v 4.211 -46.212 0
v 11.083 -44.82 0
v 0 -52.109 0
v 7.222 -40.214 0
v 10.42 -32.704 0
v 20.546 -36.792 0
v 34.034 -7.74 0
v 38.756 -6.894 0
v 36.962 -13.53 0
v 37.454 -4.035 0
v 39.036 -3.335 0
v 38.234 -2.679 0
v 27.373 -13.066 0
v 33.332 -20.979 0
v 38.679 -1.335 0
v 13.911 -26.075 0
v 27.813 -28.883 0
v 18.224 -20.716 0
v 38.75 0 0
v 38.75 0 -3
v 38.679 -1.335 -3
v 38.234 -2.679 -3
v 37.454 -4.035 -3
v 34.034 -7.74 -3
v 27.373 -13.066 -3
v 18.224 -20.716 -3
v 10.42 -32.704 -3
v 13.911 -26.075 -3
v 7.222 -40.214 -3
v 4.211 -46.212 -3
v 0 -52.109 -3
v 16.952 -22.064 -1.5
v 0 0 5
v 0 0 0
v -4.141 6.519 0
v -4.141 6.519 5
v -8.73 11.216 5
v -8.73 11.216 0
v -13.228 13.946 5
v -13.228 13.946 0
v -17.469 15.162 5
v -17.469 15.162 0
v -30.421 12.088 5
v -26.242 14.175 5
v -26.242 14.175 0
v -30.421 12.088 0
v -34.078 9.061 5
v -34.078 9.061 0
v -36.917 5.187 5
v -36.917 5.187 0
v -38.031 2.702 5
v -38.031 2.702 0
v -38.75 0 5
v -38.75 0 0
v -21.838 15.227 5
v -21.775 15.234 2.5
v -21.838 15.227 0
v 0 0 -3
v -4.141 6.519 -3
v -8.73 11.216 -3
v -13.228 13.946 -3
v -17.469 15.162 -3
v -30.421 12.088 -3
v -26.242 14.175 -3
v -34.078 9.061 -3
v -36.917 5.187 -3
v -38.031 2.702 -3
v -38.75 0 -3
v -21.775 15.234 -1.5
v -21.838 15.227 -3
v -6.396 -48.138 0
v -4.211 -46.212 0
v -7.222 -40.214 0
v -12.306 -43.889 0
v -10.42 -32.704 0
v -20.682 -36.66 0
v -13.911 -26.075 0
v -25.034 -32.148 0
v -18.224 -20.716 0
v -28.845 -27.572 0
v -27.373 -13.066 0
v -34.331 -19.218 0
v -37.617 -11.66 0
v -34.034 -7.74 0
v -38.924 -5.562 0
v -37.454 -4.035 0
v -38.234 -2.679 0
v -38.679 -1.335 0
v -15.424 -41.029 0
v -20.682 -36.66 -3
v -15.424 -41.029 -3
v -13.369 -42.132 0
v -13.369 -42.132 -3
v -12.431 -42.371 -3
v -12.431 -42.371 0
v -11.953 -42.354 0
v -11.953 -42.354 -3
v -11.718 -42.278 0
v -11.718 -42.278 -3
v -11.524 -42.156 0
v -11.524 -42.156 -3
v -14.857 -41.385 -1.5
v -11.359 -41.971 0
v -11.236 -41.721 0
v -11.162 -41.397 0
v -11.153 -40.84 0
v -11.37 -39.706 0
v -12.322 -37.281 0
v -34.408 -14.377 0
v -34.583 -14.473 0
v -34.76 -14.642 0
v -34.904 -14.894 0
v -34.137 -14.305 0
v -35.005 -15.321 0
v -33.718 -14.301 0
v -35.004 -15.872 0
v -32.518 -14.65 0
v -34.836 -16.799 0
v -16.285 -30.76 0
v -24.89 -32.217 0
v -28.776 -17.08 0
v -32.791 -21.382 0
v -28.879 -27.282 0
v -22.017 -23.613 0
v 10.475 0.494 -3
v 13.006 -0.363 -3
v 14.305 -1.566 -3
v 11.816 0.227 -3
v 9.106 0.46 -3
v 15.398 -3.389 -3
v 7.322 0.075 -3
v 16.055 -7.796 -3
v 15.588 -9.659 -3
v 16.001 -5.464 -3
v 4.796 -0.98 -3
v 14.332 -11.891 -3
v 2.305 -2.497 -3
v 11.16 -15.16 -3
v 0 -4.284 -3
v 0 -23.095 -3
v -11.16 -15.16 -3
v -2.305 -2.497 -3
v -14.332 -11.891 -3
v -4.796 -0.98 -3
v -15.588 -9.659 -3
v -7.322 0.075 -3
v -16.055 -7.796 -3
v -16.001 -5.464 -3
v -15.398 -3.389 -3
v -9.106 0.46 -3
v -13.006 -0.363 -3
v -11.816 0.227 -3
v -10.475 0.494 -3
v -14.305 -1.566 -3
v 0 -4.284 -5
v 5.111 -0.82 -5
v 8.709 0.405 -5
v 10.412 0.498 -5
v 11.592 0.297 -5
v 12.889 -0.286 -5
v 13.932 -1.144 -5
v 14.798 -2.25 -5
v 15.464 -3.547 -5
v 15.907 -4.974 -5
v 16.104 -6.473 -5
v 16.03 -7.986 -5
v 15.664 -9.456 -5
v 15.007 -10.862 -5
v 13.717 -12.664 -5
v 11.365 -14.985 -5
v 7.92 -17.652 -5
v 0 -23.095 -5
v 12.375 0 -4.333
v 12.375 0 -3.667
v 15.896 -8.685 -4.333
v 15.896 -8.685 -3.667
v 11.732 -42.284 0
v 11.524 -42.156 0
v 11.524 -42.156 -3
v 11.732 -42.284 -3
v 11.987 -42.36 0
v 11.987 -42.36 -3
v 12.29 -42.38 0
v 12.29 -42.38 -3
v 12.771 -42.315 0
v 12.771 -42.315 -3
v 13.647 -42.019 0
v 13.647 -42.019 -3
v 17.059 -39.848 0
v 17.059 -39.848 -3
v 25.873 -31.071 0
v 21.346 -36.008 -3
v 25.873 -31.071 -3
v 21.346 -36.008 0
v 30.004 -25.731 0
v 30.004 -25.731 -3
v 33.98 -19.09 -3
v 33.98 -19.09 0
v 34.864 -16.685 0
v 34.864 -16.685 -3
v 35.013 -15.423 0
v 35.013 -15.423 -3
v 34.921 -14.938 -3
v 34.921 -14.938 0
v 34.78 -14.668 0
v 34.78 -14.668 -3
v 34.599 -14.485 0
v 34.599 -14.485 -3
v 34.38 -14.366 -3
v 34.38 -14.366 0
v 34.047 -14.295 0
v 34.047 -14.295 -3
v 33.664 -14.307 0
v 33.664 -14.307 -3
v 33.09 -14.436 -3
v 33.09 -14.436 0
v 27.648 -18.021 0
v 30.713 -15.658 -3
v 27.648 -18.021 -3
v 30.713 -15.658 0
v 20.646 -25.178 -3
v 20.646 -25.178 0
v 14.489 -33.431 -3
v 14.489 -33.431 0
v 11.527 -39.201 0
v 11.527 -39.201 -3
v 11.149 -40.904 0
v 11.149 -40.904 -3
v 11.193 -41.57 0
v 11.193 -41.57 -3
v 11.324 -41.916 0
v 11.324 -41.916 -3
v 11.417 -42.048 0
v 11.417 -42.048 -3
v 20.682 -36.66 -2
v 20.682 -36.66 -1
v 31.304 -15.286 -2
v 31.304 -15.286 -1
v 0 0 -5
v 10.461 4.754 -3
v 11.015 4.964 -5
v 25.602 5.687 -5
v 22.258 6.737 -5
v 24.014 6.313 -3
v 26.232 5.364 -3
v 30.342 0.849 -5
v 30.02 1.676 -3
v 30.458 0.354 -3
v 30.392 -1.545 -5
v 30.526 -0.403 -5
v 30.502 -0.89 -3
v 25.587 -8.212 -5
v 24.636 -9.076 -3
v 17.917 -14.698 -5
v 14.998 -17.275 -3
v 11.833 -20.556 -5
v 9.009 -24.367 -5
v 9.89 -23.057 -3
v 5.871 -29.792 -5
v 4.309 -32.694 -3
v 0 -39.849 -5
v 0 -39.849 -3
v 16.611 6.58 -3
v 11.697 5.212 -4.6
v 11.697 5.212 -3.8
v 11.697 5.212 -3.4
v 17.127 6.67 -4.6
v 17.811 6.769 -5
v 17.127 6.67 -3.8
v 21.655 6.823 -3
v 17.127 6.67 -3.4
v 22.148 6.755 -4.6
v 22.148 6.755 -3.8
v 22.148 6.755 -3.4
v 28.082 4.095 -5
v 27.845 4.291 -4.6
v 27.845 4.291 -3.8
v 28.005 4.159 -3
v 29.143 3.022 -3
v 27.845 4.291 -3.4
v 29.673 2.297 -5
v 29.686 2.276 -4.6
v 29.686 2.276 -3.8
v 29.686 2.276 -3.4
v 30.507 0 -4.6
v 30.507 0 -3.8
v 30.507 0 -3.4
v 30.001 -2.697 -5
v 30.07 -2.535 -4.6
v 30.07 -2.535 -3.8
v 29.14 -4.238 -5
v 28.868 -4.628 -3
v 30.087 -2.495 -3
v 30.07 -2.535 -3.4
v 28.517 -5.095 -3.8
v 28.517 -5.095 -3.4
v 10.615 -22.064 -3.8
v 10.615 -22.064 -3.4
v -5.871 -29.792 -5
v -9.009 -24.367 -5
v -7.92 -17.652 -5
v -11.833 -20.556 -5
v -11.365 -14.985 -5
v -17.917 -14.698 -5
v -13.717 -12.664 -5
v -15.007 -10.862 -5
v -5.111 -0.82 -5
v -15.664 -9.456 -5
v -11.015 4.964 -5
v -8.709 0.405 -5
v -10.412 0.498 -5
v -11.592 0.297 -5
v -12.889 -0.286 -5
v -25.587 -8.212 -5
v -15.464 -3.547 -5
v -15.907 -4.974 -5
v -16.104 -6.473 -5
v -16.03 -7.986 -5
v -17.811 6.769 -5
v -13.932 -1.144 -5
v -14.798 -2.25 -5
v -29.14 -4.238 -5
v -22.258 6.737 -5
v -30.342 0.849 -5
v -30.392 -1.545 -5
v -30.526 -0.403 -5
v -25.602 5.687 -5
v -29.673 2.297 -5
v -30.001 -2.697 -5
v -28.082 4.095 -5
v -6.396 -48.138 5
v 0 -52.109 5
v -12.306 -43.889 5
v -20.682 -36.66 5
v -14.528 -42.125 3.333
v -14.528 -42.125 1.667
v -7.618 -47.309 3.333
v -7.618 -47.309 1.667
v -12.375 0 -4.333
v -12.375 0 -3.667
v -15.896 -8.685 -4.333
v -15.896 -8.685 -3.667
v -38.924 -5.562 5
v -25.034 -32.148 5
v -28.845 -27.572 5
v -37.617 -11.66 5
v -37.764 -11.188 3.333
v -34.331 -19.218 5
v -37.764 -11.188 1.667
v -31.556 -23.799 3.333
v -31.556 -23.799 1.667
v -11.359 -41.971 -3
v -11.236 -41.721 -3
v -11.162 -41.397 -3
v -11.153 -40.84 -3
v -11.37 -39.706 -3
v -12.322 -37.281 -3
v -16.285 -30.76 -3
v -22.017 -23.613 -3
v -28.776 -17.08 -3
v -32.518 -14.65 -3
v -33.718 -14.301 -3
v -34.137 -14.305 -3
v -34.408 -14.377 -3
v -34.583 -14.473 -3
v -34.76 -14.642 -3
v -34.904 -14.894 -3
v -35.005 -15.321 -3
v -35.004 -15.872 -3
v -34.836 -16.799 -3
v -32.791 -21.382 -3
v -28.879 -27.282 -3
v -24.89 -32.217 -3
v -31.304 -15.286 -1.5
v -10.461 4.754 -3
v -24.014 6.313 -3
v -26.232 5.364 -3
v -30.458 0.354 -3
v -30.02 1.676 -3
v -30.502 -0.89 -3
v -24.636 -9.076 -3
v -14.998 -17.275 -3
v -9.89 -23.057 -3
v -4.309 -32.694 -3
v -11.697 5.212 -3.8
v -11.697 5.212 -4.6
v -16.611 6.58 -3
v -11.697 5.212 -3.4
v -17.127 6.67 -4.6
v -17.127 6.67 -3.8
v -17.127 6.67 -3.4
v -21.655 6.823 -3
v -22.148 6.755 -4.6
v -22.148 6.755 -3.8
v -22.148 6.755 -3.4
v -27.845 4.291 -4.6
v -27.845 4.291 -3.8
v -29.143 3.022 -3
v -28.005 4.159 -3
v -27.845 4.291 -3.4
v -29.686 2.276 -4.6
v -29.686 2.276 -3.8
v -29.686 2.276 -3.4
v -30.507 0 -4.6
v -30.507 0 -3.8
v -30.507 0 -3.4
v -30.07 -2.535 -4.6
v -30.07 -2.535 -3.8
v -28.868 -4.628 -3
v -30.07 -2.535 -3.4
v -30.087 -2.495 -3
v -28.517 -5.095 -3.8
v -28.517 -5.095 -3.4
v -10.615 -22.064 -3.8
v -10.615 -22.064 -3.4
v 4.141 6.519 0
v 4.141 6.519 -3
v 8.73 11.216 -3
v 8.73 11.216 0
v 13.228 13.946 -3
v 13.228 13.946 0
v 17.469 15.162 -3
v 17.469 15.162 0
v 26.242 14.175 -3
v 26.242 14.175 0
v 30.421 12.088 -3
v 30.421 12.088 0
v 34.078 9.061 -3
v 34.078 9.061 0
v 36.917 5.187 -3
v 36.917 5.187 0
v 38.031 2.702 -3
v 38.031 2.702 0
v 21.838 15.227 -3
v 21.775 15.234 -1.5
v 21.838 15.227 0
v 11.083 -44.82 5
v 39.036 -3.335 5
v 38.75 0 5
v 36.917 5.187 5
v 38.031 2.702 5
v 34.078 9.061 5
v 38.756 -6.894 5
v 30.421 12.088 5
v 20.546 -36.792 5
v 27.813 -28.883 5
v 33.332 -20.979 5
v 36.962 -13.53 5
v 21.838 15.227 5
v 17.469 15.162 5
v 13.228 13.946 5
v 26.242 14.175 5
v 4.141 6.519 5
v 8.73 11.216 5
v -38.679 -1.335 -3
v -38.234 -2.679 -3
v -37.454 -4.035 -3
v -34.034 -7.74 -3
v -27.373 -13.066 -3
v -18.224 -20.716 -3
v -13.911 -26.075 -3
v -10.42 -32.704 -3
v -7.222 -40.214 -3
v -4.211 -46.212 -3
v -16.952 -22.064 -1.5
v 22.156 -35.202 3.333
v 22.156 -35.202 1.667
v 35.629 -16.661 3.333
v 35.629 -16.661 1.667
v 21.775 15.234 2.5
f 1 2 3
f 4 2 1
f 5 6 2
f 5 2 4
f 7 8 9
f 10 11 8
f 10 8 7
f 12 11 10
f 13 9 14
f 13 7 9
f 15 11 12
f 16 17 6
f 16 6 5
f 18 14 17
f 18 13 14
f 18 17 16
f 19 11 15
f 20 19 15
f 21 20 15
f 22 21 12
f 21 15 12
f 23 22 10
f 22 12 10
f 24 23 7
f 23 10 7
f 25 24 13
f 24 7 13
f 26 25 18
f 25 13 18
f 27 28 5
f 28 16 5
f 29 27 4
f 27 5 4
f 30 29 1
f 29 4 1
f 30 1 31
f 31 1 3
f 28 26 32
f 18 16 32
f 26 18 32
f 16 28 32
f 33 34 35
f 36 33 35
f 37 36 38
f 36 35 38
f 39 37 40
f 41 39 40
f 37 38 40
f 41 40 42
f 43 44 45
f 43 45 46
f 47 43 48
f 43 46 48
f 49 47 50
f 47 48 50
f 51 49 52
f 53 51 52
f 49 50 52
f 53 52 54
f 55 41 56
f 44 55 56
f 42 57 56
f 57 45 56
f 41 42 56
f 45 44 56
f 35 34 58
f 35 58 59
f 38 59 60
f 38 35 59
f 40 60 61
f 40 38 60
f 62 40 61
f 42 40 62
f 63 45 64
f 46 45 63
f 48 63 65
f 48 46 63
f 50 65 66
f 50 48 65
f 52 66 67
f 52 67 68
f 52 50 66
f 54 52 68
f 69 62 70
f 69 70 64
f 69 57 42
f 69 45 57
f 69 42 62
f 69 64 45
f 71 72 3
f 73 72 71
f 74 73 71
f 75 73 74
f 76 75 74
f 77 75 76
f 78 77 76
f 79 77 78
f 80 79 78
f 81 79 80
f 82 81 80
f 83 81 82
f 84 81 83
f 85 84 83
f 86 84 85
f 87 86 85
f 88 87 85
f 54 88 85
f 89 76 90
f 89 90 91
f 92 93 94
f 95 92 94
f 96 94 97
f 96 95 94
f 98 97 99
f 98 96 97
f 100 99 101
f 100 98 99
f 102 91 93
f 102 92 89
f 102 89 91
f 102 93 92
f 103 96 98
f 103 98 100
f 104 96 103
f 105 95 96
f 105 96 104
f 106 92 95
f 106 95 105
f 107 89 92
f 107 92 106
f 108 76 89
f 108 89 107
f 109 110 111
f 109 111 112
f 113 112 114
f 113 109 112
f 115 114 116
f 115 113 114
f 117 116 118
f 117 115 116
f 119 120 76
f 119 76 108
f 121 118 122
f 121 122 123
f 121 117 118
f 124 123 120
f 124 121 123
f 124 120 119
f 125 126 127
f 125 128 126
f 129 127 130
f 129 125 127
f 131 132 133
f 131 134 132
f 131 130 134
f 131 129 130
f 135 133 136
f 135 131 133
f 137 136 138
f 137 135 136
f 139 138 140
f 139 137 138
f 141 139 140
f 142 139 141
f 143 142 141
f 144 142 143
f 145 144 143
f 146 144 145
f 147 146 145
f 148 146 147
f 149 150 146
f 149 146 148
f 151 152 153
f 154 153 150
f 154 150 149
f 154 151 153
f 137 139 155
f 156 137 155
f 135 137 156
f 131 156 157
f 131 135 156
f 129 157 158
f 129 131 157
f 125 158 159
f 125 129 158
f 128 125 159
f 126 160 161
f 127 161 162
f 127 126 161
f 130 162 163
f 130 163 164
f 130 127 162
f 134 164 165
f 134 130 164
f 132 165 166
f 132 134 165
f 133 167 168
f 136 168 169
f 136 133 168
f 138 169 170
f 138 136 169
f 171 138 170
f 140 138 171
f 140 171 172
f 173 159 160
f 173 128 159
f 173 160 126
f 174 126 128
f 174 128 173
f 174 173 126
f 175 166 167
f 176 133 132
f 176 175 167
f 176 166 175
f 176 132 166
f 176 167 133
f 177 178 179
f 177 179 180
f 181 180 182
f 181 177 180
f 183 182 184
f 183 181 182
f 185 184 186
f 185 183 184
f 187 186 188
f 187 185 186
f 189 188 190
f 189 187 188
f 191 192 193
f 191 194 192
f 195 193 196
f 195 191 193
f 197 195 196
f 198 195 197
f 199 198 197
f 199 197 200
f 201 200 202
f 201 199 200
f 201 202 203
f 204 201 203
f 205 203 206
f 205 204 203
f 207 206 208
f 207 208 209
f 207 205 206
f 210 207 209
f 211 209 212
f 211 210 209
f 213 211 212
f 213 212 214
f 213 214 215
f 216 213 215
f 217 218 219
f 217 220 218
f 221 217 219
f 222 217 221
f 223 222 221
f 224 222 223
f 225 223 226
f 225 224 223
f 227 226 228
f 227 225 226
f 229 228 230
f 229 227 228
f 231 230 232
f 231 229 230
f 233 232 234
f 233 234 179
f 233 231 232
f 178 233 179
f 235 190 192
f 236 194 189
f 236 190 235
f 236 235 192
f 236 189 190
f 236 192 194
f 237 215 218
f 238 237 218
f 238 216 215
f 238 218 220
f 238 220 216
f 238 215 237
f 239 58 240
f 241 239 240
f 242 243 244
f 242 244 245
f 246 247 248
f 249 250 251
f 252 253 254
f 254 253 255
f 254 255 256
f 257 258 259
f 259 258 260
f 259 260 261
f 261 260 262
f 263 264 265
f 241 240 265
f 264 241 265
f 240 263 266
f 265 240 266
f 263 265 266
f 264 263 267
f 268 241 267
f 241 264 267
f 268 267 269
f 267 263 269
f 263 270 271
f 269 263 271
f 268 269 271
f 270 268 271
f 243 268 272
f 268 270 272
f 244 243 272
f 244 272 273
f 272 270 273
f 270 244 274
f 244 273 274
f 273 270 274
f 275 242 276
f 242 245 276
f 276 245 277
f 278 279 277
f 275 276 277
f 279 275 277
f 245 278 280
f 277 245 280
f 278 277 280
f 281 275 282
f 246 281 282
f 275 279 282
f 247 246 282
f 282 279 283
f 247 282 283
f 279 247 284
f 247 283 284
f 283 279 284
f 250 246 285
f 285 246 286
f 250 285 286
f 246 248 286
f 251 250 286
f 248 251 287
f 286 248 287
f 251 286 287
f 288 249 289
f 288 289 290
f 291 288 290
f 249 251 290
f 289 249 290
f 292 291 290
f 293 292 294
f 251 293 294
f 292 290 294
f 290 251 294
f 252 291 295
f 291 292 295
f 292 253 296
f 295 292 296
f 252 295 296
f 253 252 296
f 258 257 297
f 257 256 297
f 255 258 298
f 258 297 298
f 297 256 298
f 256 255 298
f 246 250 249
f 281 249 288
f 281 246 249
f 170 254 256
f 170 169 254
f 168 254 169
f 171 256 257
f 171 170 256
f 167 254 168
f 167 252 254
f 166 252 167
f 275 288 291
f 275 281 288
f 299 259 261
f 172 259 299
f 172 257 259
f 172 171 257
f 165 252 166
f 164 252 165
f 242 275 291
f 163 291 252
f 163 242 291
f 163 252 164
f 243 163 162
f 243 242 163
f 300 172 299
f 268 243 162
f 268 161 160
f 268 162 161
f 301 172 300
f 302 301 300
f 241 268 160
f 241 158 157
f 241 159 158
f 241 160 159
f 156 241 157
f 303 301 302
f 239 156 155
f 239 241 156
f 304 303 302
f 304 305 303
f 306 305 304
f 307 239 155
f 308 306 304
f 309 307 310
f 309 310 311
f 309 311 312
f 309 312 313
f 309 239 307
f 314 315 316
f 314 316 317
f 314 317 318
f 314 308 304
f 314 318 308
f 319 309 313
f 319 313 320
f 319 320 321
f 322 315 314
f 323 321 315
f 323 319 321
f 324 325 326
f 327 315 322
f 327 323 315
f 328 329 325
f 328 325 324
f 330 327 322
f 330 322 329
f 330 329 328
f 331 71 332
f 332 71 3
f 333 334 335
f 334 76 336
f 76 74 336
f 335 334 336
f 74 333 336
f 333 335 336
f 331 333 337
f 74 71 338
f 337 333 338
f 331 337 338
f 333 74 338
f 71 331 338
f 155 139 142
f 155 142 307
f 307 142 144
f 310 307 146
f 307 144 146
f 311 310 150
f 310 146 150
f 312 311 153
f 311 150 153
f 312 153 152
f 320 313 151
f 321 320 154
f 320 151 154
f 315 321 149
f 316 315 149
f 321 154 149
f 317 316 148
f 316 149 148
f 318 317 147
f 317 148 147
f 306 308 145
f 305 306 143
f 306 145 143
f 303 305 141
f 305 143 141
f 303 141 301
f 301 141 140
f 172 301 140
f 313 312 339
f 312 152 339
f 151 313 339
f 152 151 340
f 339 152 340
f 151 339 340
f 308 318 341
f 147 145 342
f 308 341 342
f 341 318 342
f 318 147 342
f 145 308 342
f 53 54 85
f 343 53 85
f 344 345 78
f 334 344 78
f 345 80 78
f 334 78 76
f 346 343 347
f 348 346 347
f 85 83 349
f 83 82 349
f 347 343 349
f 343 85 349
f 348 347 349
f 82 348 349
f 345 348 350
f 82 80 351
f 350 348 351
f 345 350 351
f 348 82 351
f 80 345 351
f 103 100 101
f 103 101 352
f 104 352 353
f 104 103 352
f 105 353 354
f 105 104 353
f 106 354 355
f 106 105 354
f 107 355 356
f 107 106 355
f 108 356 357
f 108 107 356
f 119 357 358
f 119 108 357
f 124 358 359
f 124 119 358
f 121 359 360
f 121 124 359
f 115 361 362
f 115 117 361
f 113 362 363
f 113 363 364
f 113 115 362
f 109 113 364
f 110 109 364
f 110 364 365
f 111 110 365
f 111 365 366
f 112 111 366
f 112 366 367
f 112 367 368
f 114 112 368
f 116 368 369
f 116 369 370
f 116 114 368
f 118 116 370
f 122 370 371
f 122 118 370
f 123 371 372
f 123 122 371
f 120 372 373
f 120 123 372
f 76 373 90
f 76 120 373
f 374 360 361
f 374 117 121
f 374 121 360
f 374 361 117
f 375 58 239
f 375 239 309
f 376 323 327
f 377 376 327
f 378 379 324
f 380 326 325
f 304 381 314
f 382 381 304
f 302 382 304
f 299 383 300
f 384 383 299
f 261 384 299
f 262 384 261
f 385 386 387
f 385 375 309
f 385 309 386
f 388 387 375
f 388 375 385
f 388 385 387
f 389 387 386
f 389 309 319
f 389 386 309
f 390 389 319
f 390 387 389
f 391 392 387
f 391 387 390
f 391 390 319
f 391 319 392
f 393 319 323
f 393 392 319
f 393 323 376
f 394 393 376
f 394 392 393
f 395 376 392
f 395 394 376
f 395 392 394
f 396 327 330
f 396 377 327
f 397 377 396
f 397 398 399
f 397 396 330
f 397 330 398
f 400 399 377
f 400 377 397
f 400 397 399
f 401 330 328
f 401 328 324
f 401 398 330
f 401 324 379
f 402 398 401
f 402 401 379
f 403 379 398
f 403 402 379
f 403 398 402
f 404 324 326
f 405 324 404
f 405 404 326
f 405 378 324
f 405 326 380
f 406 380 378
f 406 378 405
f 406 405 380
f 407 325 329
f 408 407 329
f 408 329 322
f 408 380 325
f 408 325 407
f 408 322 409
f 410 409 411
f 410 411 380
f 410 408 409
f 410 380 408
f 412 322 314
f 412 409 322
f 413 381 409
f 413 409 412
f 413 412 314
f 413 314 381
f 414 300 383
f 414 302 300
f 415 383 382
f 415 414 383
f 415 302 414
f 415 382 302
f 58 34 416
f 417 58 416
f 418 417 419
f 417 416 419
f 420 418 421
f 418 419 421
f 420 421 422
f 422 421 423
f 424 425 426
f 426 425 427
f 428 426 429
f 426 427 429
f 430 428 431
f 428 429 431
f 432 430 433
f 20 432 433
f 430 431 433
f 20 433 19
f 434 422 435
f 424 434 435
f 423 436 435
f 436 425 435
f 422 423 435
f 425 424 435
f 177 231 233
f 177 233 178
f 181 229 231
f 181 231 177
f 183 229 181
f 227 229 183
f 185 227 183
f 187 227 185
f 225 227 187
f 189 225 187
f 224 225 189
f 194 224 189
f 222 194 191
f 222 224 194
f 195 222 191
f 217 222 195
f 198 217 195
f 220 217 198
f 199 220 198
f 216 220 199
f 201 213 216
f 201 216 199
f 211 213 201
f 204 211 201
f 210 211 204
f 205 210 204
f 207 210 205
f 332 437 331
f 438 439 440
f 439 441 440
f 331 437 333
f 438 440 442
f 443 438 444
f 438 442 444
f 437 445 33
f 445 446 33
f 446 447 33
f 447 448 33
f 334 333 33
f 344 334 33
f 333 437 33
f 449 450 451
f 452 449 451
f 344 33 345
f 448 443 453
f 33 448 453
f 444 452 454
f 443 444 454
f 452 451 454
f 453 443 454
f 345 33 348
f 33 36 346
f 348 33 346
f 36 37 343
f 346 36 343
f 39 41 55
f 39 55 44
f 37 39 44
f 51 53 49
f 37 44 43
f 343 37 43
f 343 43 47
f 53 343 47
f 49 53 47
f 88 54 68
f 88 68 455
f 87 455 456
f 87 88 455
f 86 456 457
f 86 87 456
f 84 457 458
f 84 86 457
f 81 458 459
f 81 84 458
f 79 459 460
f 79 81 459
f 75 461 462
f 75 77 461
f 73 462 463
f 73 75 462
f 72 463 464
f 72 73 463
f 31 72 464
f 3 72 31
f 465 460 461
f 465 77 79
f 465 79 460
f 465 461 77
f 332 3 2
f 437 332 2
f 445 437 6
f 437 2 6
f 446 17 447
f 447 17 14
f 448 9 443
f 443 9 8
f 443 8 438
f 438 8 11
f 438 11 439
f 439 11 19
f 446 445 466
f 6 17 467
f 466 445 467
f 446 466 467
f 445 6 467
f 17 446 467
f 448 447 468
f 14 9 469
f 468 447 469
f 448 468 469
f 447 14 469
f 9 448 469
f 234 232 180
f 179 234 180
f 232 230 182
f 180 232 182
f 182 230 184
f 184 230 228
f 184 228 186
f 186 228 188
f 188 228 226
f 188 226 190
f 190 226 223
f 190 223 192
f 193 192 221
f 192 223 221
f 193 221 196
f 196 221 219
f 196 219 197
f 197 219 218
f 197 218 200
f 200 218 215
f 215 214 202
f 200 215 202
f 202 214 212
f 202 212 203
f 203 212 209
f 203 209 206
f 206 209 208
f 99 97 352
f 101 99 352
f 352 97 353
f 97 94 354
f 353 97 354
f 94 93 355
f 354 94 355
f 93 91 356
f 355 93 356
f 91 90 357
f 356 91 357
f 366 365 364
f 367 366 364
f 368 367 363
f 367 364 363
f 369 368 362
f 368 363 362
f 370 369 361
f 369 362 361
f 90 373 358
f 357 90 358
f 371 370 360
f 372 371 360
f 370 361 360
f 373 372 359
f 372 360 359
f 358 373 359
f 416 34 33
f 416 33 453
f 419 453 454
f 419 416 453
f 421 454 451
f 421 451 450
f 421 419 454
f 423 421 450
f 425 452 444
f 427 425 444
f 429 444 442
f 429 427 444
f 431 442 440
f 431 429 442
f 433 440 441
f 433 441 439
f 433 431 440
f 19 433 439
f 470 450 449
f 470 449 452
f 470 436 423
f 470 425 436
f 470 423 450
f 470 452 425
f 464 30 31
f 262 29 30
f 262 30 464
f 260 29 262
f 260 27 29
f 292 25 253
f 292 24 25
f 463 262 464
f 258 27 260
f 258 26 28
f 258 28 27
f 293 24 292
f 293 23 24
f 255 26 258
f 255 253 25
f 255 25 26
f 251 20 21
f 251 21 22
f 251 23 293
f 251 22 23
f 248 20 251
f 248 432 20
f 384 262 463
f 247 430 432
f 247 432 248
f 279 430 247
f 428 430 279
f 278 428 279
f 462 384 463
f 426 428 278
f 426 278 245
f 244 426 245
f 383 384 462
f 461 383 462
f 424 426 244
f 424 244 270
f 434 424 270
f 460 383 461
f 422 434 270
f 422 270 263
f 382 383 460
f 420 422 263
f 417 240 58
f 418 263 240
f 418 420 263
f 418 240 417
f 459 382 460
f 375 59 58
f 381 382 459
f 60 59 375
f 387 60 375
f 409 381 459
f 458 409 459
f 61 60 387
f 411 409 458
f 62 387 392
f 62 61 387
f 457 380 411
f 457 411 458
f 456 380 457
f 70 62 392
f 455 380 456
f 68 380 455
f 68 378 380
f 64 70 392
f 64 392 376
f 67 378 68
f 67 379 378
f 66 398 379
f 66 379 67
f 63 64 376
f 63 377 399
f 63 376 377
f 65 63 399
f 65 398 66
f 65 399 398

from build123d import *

# Parameters (mm, degrees)
F1_DEPTH = 5
F2_DEPTH = 3
F3_DEPTH = 5


# Not quite as in the source:
# - a feature names something its author has since deleted; it is built from what else it names


with BuildPart() as f1:
    # F0 (on Top) → F1 (new body)
    with BuildSketch(Plane.XY):
        with BuildLine():
            add(Edge.make_bspline(
                [(0, 0), (5.8826601211, 11.2702567006), (20.8111578849, 20.6386629418), (37.2014190882, 8.6220207342), (38.749657821, 0)],
                knots=[0, 0, 0, 0, 0.2865659188, 0.5520449891, 0.5520449891, 0.5520449891, 0.5520449891], degree=3))
            add(Edge.make_bspline(
                [(0, 0), (-5.8826601211, 11.2702567006), (-20.8111578849, 20.6386629418), (-37.2014190882, 8.6220207342), (-38.749657821, 0)],
                knots=[0, 0, 0, 0, 0.2865659188, 0.5520449891, 0.5520449891, 0.5520449891, 0.5520449891], degree=3))
            add(Edge.make_bspline(
                [(-38.749657821, 0), (-39.4012299945, -6.6213969341), (-9.0327868439, -20.6953577001), (-8.685916815, -42.126413839), (0, -52.1089205623)],
                knots=[0, 0, 0, 0, 0.4867027196, 1, 1, 1, 1], degree=3))
            add(Edge.make_bspline(
                [(38.749657821, 0), (39.4012299945, -6.6213969341), (9.0327868439, -20.6953577001), (8.685916815, -42.126413839), (0, -52.1089205623)],
                knots=[0, 0, 0, 0, 0.4867027196, 1, 1, 1, 1], degree=3))
        make_face()
        with BuildLine():
            add(Edge.make_bspline(
                [(0, 0), (-8.039671318, 3.887850868), (-21.0375310132, 10.3979423013), (-34.1851204628, -0.0331959557), (-22.9358554941, -11.1083712256), (-9.0780722669, -20.9680892381), (-4.1014407761, -34.0341217816), (0, -39.8491583765)],
                knots=[0, 0, 0, 0, 0.236574756, 0.3977476477, 0.5702206455, 0.7762521683, 1, 1, 1, 1], degree=3))
            add(Edge.make_bspline(
                [(0, 0), (8.039671318, 3.887850868), (21.0375310132, 10.3979423013), (34.1851204628, -0.0331959557), (22.9358554941, -11.1083712256), (9.0780722669, -20.9680892381), (4.1014407761, -34.0341217816), (0, -39.8491583765)],
                knots=[0, 0, 0, 0, 0.236574756, 0.3977476477, 0.5702206455, 0.7762521683, 1, 1, 1, 1], degree=3))
        make_face(mode=Mode.SUBTRACT)
        with BuildLine():
            add(Edge.make_bspline(
                [(0, 0), (8.039671318, 3.887850868), (21.0375310132, 10.3979423013), (34.1851204628, -0.0331959557), (22.9358554941, -11.1083712256), (9.0780722669, -20.9680892381), (4.1014407761, -34.0341217816), (0, -39.8491583765)],
                knots=[0, 0, 0, 0, 0.236574756, 0.3977476477, 0.5702206455, 0.7762521683, 1, 1, 1, 1], degree=3))
            add(Edge.make_bspline(
                [(0, 0), (-8.039671318, 3.887850868), (-21.0375310132, 10.3979423013), (-34.1851204628, -0.0331959557), (-22.9358554941, -11.1083712256), (-9.0780722669, -20.9680892381), (-4.1014407761, -34.0341217816), (0, -39.8491583765)],
                knots=[0, 0, 0, 0, 0.236574756, 0.3977476477, 0.5702206455, 0.7762521683, 1, 1, 1, 1], degree=3))
        make_face()
        with BuildLine():
            add(Edge.make_bspline(
                [(0, -4.2843823321), (-4.3131672708, -0.5965221259), (-13.217639527, 3.3797390078), (-19.1463981552, -11.3037035401), (-7.8477509016, -17.6284155745), (0, -23.0948515236)],
                knots=[0, 0, 0, 0, 0.3199063089, 0.5905308347, 1, 1, 1, 1], degree=3))
            add(Edge.make_bspline(
                [(0, -4.2843823321), (4.3131672708, -0.5965221259), (13.217639527, 3.3797390078), (19.1463981552, -11.3037035401), (7.8477509016, -17.6284155745), (0, -23.0948515236)],
                knots=[0, 0, 0, 0, 0.3199063089, 0.5905308347, 1, 1, 1, 1], degree=3))
        make_face(mode=Mode.SUBTRACT)
        with BuildLine():
            add(Edge.make_bspline(
                [(0, -4.2843823321), (4.3131672708, -0.5965221259), (13.217639527, 3.3797390078), (19.1463981552, -11.3037035401), (7.8477509016, -17.6284155745), (0, -23.0948515236)],
                knots=[0, 0, 0, 0, 0.3199063089, 0.5905308347, 1, 1, 1, 1], degree=3))
            add(Edge.make_bspline(
                [(0, -4.2843823321), (-4.3131672708, -0.5965221259), (-13.217639527, 3.3797390078), (-19.1463981552, -11.3037035401), (-7.8477509016, -17.6284155745), (0, -23.0948515236)],
                knots=[0, 0, 0, 0, 0.3199063089, 0.5905308347, 1, 1, 1, 1], degree=3))
        make_face()
        with BuildLine():
            add(Edge.make_bspline(
                [(-38.749657821, 0), (-39.4012299945, -6.6213969341), (-9.0327868439, -20.6953577001), (-8.685916815, -42.126413839), (0, -52.1089205623)],
                knots=[0, 0, 0, 0, 0.4867027196, 1, 1, 1, 1], degree=3))
            add(Edge.make_bspline(
                [(-38.749657821, 0), (-40.5608709324, -10.0865045363), (-33.7038328837, -24.0640985889), (-20.6823740602, -36.6602716931)],
                knots=[0.5520449891, 0.5520449891, 0.5520449891, 0.5520449891, 0.8626167135, 0.8626167135, 0.8626167135, 0.8626167135], degree=3))
            add(Edge.make_bspline(
                [(-20.6823740602, -36.6602716931), (-14.9222527489, -42.2322652862), (-7.9558844229, -47.5339439616), (0, -52.1089205623)],
                knots=[0.8626167135, 0.8626167135, 0.8626167135, 0.8626167135, 1, 1, 1, 1], degree=3))
        make_face()
        with BuildLine():
            add(Edge.make_bspline(
                [(-20.6823740602, -36.6602716931), (-13.3891185223, -43.7153269099), (-11.5241668889, -42.155893369)],
                knots=[5.1678619688, 5.1678619688, 5.1678619688, 6.2831853072, 6.2831853072, 6.2831853072], degree=2, weights=[1, 0.8484948826, 1]))
            add(Edge.make_bspline(
                [(-11.5241668889, -42.155893369), (-1.0796225414, -33.4223838863), (-31.3037078069, -15.2856312429), (-61.5277930724, 2.8511214004), (-20.6823740602, -36.6602716931)],
                knots=[0, 0, 0, 2.5839309844, 2.5839309844, 5.1678619688, 5.1678619688, 5.1678619688], degree=2, weights=[1, 0.2752318272, 1, 0.2752318272, 1]))
        make_face(mode=Mode.SUBTRACT)
        with BuildLine():
            add(Edge.make_bspline(
                [(38.749657821, 0), (40.5608709326, -10.0865045375), (33.7038328821, -24.0640985922), (20.6823740557, -36.6602716974)],
                knots=[0.5520449891, 0.5520449891, 0.5520449891, 0.5520449891, 0.8626167135, 0.8626167135, 0.8626167135, 0.8626167135], degree=3))
            add(Edge.make_bspline(
                [(38.749657821, 0), (39.4012299945, -6.6213969341), (9.0327868439, -20.6953577001), (8.685916815, -42.126413839), (0, -52.1089205623)],
                knots=[0, 0, 0, 0, 0.4867027196, 1, 1, 1, 1], degree=3))
            add(Edge.make_bspline(
                [(20.6823740557, -36.6602716974), (14.9222527452, -42.232265289), (7.9558844208, -47.5339439628), (0, -52.1089205623)],
                knots=[0.8626167135, 0.8626167135, 0.8626167135, 0.8626167135, 1, 1, 1, 1], degree=3))
        make_face()
        with BuildLine():
            add(Edge.make_bspline(
                [(20.6823740557, -36.6602716974), (61.5277930795, 2.8511213993), (31.3037078086, -15.2856312419), (1.0796225376, -33.4223838832), (11.5241668889, -42.155893369)],
                knots=[1.115323338, 1.115323338, 1.115323338, 3.6992543226, 3.6992543226, 6.2831853072, 6.2831853072, 6.2831853072], degree=2, weights=[1, 0.2752318271, 1, 0.2752318271, 1]))
            add(Edge.make_bspline(
                [(11.5241668889, -42.155893369), (13.3891185215, -43.7153269093), (20.6823740557, -36.6602716974)],
                knots=[0, 0, 0, 1.115323338, 1.115323338, 1.115323338], degree=2, weights=[1, 0.8484948827, 1]))
        make_face(mode=Mode.SUBTRACT)
        with BuildLine():
            add(Edge.make_bspline(
                [(-11.5241668889, -42.155893369), (-1.0796225414, -33.4223838863), (-31.3037078069, -15.2856312429), (-61.5277930724, 2.8511214004), (-20.6823740602, -36.6602716931)],
                knots=[0, 0, 0, 2.5839309844, 2.5839309844, 5.1678619688, 5.1678619688, 5.1678619688], degree=2, weights=[1, 0.2752318272, 1, 0.2752318272, 1]))
            add(Edge.make_bspline(
                [(-20.6823740602, -36.6602716931), (-13.3891185223, -43.7153269099), (-11.5241668889, -42.155893369)],
                knots=[5.1678619688, 5.1678619688, 5.1678619688, 6.2831853072, 6.2831853072, 6.2831853072], degree=2, weights=[1, 0.8484948826, 1]))
        make_face()
        with BuildLine():
            add(Edge.make_bspline(
                [(11.5241668889, -42.155893369), (13.3891185215, -43.7153269093), (20.6823740557, -36.6602716974)],
                knots=[0, 0, 0, 1.115323338, 1.115323338, 1.115323338], degree=2, weights=[1, 0.8484948827, 1]))
            add(Edge.make_bspline(
                [(20.6823740557, -36.6602716974), (61.5277930795, 2.8511213993), (31.3037078086, -15.2856312419), (1.0796225376, -33.4223838832), (11.5241668889, -42.155893369)],
                knots=[1.115323338, 1.115323338, 1.115323338, 3.6992543226, 3.6992543226, 6.2831853072, 6.2831853072, 6.2831853072], degree=2, weights=[1, 0.2752318271, 1, 0.2752318271, 1]))
        make_face()
    extrude(amount=F1_DEPTH)

    # F0 (on Top) → F2 (join)
    with BuildSketch(Plane.XY):
        with BuildLine():
            add(Edge.make_bspline(
                [(0, 0), (5.8826601211, 11.2702567006), (20.8111578849, 20.6386629418), (37.2014190882, 8.6220207342), (38.749657821, 0)],
                knots=[0, 0, 0, 0, 0.2865659188, 0.5520449891, 0.5520449891, 0.5520449891, 0.5520449891], degree=3))
            add(Edge.make_bspline(
                [(0, 0), (-5.8826601211, 11.2702567006), (-20.8111578849, 20.6386629418), (-37.2014190882, 8.6220207342), (-38.749657821, 0)],
                knots=[0, 0, 0, 0, 0.2865659188, 0.5520449891, 0.5520449891, 0.5520449891, 0.5520449891], degree=3))
            add(Edge.make_bspline(
                [(-38.749657821, 0), (-39.4012299945, -6.6213969341), (-9.0327868439, -20.6953577001), (-8.685916815, -42.126413839), (0, -52.1089205623)],
                knots=[0, 0, 0, 0, 0.4867027196, 1, 1, 1, 1], degree=3))
            add(Edge.make_bspline(
                [(38.749657821, 0), (39.4012299945, -6.6213969341), (9.0327868439, -20.6953577001), (8.685916815, -42.126413839), (0, -52.1089205623)],
                knots=[0, 0, 0, 0, 0.4867027196, 1, 1, 1, 1], degree=3))
        make_face()
        with BuildLine():
            add(Edge.make_bspline(
                [(0, 0), (-8.039671318, 3.887850868), (-21.0375310132, 10.3979423013), (-34.1851204628, -0.0331959557), (-22.9358554941, -11.1083712256), (-9.0780722669, -20.9680892381), (-4.1014407761, -34.0341217816), (0, -39.8491583765)],
                knots=[0, 0, 0, 0, 0.236574756, 0.3977476477, 0.5702206455, 0.7762521683, 1, 1, 1, 1], degree=3))
            add(Edge.make_bspline(
                [(0, 0), (8.039671318, 3.887850868), (21.0375310132, 10.3979423013), (34.1851204628, -0.0331959557), (22.9358554941, -11.1083712256), (9.0780722669, -20.9680892381), (4.1014407761, -34.0341217816), (0, -39.8491583765)],
                knots=[0, 0, 0, 0, 0.236574756, 0.3977476477, 0.5702206455, 0.7762521683, 1, 1, 1, 1], degree=3))
        make_face(mode=Mode.SUBTRACT)
        with BuildLine():
            add(Edge.make_bspline(
                [(0, 0), (8.039671318, 3.887850868), (21.0375310132, 10.3979423013), (34.1851204628, -0.0331959557), (22.9358554941, -11.1083712256), (9.0780722669, -20.9680892381), (4.1014407761, -34.0341217816), (0, -39.8491583765)],
                knots=[0, 0, 0, 0, 0.236574756, 0.3977476477, 0.5702206455, 0.7762521683, 1, 1, 1, 1], degree=3))
            add(Edge.make_bspline(
                [(0, 0), (-8.039671318, 3.887850868), (-21.0375310132, 10.3979423013), (-34.1851204628, -0.0331959557), (-22.9358554941, -11.1083712256), (-9.0780722669, -20.9680892381), (-4.1014407761, -34.0341217816), (0, -39.8491583765)],
                knots=[0, 0, 0, 0, 0.236574756, 0.3977476477, 0.5702206455, 0.7762521683, 1, 1, 1, 1], degree=3))
        make_face()
        with BuildLine():
            add(Edge.make_bspline(
                [(0, -4.2843823321), (-4.3131672708, -0.5965221259), (-13.217639527, 3.3797390078), (-19.1463981552, -11.3037035401), (-7.8477509016, -17.6284155745), (0, -23.0948515236)],
                knots=[0, 0, 0, 0, 0.3199063089, 0.5905308347, 1, 1, 1, 1], degree=3))
            add(Edge.make_bspline(
                [(0, -4.2843823321), (4.3131672708, -0.5965221259), (13.217639527, 3.3797390078), (19.1463981552, -11.3037035401), (7.8477509016, -17.6284155745), (0, -23.0948515236)],
                knots=[0, 0, 0, 0, 0.3199063089, 0.5905308347, 1, 1, 1, 1], degree=3))
        make_face(mode=Mode.SUBTRACT)
        with BuildLine():
            add(Edge.make_bspline(
                [(0, -4.2843823321), (4.3131672708, -0.5965221259), (13.217639527, 3.3797390078), (19.1463981552, -11.3037035401), (7.8477509016, -17.6284155745), (0, -23.0948515236)],
                knots=[0, 0, 0, 0, 0.3199063089, 0.5905308347, 1, 1, 1, 1], degree=3))
            add(Edge.make_bspline(
                [(0, -4.2843823321), (-4.3131672708, -0.5965221259), (-13.217639527, 3.3797390078), (-19.1463981552, -11.3037035401), (-7.8477509016, -17.6284155745), (0, -23.0948515236)],
                knots=[0, 0, 0, 0, 0.3199063089, 0.5905308347, 1, 1, 1, 1], degree=3))
        make_face()
    extrude(amount=-F2_DEPTH)

    # F0 (on Top) → F3 (join)
    with BuildSketch(Plane.XY):
        with BuildLine():
            add(Edge.make_bspline(
                [(0, 0), (8.039671318, 3.887850868), (21.0375310132, 10.3979423013), (34.1851204628, -0.0331959557), (22.9358554941, -11.1083712256), (9.0780722669, -20.9680892381), (4.1014407761, -34.0341217816), (0, -39.8491583765)],
                knots=[0, 0, 0, 0, 0.236574756, 0.3977476477, 0.5702206455, 0.7762521683, 1, 1, 1, 1], degree=3))
            add(Edge.make_bspline(
                [(0, 0), (-8.039671318, 3.887850868), (-21.0375310132, 10.3979423013), (-34.1851204628, -0.0331959557), (-22.9358554941, -11.1083712256), (-9.0780722669, -20.9680892381), (-4.1014407761, -34.0341217816), (0, -39.8491583765)],
                knots=[0, 0, 0, 0, 0.236574756, 0.3977476477, 0.5702206455, 0.7762521683, 1, 1, 1, 1], degree=3))
        make_face()
        with BuildLine():
            add(Edge.make_bspline(
                [(0, -4.2843823321), (-4.3131672708, -0.5965221259), (-13.217639527, 3.3797390078), (-19.1463981552, -11.3037035401), (-7.8477509016, -17.6284155745), (0, -23.0948515236)],
                knots=[0, 0, 0, 0, 0.3199063089, 0.5905308347, 1, 1, 1, 1], degree=3))
            add(Edge.make_bspline(
                [(0, -4.2843823321), (4.3131672708, -0.5965221259), (13.217639527, 3.3797390078), (19.1463981552, -11.3037035401), (7.8477509016, -17.6284155745), (0, -23.0948515236)],
                knots=[0, 0, 0, 0, 0.3199063089, 0.5905308347, 1, 1, 1, 1], degree=3))
        make_face(mode=Mode.SUBTRACT)
    extrude(amount=-F3_DEPTH)


with BuildPart() as f2:
    # F0 (on Top) → F2, piece 2 (new body)
    with BuildSketch(Plane.XY):
        with BuildLine():
            add(Edge.make_bspline(
                [(11.5241668889, -42.155893369), (13.3891185215, -43.7153269093), (20.6823740557, -36.6602716974)],
                knots=[0, 0, 0, 1.115323338, 1.115323338, 1.115323338], degree=2, weights=[1, 0.8484948827, 1]))
            add(Edge.make_bspline(
                [(20.6823740557, -36.6602716974), (61.5277930795, 2.8511213993), (31.3037078086, -15.2856312419), (1.0796225376, -33.4223838832), (11.5241668889, -42.155893369)],
                knots=[1.115323338, 1.115323338, 1.115323338, 3.6992543226, 3.6992543226, 6.2831853072, 6.2831853072, 6.2831853072], degree=2, weights=[1, 0.2752318271, 1, 0.2752318271, 1]))
        make_face()
    extrude(amount=-F2_DEPTH)


with BuildPart() as f2b:
    # F0 (on Top) → F2, piece 3 (new body)
    with BuildSketch(Plane.XY):
        with BuildLine():
            add(Edge.make_bspline(
                [(-11.5241668889, -42.155893369), (-1.0796225414, -33.4223838863), (-31.3037078069, -15.2856312429), (-61.5277930724, 2.8511214004), (-20.6823740602, -36.6602716931)],
                knots=[0, 0, 0, 2.5839309844, 2.5839309844, 5.1678619688, 5.1678619688, 5.1678619688], degree=2, weights=[1, 0.2752318272, 1, 0.2752318272, 1]))
            add(Edge.make_bspline(
                [(-20.6823740602, -36.6602716931), (-13.3891185223, -43.7153269099), (-11.5241668889, -42.155893369)],
                knots=[5.1678619688, 5.1678619688, 5.1678619688, 6.2831853072, 6.2831853072, 6.2831853072], degree=2, weights=[1, 0.8484948826, 1]))
        make_face()
    extrude(amount=-F2_DEPTH)


solid = Compound([f1.part, f2.part, f2b.part])
